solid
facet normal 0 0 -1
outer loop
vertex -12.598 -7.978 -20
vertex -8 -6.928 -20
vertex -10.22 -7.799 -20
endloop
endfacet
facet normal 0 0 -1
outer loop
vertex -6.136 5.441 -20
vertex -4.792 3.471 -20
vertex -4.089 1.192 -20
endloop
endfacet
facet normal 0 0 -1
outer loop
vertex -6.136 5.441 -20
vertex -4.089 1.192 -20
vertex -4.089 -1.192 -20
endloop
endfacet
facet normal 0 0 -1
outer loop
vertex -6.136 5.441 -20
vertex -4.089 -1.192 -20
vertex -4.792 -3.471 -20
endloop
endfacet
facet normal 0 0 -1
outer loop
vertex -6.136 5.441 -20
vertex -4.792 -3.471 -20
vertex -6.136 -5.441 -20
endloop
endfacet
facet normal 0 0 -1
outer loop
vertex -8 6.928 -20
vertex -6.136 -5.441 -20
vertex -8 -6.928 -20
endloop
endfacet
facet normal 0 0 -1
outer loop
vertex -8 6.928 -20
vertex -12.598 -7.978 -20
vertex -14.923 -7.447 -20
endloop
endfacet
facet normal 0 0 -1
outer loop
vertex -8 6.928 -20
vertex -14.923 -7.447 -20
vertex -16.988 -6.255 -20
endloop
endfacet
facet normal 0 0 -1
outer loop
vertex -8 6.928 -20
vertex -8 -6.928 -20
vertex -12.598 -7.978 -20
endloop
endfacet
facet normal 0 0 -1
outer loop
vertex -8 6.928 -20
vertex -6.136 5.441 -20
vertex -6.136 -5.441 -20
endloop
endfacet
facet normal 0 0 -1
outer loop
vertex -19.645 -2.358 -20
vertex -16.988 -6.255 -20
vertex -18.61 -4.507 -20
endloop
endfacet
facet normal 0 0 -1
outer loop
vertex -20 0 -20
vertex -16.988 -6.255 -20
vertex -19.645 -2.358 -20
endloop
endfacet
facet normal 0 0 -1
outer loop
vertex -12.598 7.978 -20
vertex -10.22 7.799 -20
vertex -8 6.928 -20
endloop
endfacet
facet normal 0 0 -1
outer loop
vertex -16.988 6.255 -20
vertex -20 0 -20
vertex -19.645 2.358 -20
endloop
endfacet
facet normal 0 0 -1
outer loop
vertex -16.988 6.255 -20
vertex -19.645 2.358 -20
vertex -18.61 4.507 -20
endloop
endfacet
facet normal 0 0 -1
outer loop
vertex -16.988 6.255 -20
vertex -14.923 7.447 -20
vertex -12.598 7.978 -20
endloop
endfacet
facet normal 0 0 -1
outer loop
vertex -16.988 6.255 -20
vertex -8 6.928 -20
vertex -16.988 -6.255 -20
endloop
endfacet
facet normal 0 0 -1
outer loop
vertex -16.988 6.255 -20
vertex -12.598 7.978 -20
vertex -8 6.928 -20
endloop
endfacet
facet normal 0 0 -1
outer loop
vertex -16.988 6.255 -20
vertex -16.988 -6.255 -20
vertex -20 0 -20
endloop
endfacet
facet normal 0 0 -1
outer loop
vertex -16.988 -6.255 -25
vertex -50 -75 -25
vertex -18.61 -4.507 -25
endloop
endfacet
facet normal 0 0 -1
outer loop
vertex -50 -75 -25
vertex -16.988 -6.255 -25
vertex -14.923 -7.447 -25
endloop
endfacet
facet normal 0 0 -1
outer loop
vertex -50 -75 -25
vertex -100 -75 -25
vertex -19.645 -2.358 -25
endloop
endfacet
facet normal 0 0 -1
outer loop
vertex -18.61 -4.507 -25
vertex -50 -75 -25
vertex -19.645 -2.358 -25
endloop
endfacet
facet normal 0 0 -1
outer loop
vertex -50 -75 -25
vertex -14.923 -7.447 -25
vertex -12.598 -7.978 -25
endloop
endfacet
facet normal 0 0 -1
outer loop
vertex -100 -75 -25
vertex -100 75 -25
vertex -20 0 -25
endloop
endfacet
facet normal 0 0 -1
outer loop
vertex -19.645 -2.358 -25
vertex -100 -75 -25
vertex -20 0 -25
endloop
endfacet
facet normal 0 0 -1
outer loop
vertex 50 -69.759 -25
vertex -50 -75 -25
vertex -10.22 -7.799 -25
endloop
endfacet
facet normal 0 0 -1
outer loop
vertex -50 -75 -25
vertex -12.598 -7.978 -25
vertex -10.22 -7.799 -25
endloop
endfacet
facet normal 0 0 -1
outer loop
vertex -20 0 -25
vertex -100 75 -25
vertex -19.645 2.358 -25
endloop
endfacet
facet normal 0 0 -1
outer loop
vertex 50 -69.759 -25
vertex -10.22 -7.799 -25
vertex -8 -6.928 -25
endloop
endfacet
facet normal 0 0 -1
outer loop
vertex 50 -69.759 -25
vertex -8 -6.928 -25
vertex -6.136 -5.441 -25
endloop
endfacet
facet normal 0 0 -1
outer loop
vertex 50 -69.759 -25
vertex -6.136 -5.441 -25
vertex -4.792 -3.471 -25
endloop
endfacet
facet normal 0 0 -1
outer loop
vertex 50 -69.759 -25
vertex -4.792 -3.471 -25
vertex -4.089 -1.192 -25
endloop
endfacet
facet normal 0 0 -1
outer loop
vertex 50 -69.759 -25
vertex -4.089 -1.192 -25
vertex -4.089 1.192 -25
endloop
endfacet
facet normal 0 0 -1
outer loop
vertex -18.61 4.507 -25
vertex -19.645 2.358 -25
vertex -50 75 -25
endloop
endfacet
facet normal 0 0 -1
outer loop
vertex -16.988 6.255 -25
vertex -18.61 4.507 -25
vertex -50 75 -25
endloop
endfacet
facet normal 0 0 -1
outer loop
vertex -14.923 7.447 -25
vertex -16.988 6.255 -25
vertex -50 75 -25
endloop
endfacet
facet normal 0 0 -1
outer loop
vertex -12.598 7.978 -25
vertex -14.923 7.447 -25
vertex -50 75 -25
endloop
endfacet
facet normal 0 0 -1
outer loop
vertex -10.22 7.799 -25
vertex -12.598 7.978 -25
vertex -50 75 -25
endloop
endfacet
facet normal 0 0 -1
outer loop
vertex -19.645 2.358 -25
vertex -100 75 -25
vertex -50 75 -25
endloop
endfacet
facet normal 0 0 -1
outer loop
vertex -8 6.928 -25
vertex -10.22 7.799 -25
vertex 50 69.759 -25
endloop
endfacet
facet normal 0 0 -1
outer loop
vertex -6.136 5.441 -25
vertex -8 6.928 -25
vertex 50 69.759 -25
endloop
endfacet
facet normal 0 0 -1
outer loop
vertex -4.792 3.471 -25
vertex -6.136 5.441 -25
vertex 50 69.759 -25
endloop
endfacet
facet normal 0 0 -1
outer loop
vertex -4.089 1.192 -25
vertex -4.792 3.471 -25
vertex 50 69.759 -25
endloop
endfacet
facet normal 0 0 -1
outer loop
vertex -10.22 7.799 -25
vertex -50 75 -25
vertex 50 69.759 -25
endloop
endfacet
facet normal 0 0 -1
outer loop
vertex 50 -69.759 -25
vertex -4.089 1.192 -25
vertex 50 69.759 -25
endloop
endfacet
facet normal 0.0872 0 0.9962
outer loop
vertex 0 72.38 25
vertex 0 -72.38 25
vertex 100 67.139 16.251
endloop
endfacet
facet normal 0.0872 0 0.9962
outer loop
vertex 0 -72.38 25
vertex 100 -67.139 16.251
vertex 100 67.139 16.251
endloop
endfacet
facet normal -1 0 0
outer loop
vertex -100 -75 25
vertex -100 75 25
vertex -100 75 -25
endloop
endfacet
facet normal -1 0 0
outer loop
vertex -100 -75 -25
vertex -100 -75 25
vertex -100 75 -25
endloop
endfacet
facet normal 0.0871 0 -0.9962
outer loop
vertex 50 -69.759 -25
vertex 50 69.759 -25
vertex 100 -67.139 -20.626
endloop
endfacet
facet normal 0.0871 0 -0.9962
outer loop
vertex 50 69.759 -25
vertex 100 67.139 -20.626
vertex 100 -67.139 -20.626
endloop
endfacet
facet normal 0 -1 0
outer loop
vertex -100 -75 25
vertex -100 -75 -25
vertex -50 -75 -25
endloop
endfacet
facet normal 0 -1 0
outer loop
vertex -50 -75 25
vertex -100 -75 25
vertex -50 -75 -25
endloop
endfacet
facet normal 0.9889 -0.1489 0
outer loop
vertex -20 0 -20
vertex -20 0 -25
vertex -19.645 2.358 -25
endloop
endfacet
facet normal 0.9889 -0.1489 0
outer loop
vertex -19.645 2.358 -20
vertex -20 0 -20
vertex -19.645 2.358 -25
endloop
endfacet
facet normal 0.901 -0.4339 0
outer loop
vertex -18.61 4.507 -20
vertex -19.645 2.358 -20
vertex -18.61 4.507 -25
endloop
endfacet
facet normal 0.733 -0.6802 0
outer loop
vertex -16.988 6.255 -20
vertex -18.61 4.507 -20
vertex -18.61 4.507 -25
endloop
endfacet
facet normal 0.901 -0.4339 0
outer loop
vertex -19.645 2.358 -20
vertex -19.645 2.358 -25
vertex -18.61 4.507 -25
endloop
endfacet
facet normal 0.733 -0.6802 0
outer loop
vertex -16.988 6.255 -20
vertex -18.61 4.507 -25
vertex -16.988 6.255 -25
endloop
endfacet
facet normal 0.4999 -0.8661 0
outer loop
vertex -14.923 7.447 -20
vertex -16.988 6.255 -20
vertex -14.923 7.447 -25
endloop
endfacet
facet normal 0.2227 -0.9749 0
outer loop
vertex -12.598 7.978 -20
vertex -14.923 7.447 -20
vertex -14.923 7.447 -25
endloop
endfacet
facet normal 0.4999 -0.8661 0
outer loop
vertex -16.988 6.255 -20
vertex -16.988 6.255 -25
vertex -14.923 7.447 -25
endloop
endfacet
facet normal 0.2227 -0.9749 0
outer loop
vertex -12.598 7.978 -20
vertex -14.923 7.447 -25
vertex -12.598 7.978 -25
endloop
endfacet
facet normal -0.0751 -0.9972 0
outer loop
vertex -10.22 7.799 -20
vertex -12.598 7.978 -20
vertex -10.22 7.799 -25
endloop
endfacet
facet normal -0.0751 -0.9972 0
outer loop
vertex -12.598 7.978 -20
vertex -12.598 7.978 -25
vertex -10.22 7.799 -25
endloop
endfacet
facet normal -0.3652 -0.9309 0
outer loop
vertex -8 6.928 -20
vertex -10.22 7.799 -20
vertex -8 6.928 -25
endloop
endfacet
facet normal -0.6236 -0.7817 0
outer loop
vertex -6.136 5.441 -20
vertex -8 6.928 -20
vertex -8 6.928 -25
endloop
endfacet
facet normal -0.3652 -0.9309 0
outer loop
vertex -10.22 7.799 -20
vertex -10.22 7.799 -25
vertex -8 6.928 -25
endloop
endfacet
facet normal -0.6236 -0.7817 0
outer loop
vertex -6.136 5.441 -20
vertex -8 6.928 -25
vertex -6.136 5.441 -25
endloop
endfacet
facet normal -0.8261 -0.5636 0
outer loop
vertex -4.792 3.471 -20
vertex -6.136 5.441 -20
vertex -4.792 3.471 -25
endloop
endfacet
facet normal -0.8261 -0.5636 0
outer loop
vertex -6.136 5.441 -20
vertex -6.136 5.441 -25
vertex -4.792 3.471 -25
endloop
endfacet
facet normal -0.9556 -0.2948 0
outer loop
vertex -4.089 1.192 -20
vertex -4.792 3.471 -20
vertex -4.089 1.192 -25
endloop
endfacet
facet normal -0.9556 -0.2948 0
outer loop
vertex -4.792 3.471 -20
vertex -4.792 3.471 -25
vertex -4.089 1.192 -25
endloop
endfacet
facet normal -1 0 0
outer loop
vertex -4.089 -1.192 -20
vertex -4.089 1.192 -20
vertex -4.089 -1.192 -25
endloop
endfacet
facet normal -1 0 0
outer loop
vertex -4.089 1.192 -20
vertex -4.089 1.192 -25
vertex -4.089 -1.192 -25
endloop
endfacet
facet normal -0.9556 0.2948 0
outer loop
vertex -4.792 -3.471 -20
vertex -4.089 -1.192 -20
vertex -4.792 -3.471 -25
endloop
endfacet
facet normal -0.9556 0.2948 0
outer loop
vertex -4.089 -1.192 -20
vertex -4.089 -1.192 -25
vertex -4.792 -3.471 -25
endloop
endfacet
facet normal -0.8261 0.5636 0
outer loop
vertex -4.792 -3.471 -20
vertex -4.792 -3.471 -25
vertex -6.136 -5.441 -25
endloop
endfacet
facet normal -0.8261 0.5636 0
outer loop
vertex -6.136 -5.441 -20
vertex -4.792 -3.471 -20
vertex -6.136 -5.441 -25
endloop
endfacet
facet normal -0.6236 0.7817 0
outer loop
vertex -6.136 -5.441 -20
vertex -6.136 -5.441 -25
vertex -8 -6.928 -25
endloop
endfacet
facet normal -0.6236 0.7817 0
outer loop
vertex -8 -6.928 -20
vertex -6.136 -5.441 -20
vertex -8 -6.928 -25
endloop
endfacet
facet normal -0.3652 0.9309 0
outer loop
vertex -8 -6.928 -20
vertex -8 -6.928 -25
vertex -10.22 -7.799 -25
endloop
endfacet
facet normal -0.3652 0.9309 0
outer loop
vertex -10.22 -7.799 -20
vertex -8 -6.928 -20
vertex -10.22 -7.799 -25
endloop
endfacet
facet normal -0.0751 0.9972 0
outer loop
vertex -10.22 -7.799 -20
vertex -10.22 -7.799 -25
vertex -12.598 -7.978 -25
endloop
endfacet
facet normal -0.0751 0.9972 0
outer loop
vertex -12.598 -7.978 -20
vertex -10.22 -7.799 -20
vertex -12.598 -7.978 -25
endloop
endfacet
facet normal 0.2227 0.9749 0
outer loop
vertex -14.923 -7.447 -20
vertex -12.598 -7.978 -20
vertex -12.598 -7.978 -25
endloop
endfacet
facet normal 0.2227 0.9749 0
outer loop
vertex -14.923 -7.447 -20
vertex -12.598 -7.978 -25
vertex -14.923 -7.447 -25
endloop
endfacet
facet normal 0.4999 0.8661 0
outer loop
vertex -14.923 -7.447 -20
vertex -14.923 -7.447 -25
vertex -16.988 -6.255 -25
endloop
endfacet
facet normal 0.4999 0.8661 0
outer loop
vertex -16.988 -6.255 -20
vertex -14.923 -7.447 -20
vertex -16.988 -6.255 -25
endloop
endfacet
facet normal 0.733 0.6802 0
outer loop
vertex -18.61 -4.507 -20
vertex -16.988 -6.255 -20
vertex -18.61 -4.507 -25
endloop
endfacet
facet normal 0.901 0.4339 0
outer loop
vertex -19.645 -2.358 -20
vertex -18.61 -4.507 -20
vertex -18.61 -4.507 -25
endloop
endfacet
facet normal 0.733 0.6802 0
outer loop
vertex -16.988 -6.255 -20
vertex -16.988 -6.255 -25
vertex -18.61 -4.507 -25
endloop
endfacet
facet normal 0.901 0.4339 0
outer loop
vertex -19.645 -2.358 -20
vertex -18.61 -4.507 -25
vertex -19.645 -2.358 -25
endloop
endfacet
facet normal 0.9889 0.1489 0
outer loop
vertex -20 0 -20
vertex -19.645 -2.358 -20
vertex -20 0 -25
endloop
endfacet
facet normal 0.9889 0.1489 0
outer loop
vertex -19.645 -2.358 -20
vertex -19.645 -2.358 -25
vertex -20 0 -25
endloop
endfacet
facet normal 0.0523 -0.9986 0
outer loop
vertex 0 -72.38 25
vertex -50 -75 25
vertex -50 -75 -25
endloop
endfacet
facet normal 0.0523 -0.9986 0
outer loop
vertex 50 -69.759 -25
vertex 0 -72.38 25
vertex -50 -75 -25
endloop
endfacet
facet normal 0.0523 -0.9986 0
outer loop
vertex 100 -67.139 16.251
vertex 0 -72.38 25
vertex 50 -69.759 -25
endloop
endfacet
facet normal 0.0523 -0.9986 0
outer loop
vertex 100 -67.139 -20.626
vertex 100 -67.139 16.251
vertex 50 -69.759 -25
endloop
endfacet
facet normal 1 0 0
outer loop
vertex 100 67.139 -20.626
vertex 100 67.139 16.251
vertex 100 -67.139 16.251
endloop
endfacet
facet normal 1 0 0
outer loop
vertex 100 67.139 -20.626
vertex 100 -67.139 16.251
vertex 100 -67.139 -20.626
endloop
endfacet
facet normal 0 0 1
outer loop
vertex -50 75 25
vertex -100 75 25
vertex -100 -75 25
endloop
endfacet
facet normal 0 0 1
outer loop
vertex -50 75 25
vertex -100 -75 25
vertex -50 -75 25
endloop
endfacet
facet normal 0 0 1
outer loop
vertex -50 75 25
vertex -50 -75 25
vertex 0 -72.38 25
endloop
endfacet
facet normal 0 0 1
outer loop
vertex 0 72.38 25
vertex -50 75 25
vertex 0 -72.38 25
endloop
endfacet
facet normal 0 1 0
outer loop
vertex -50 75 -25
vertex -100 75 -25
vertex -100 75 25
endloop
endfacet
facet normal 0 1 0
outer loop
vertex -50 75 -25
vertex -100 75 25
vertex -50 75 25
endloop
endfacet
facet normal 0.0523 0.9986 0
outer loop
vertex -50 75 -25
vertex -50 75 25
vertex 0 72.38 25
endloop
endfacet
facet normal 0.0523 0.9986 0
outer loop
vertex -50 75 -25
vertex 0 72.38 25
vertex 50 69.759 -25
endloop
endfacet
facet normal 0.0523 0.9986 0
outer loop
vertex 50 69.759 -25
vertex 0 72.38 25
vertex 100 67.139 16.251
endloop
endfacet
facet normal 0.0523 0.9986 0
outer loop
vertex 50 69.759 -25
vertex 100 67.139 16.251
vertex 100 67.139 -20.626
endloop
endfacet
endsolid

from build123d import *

# Parameters (mm, degrees)
SKETCH_1_W          = 200
SKETCH_1_H          = 50
EXTRUDE_1_DEPTH     = 75
CHAMFER_1_SIZE      = 100
CHAMFER_1_SIZE2     = 8.748866353
CHAMFER_2_SIZE      = 50
CHAMFER_2_SIZE2     = 4.374433176
CHAMFER_3_SIZE      = 150
CHAMFER_3_SIZE2     = 7.861166892
CHAMFER_4_SIZE      = 150
CHAMFER_4_SIZE2     = 7.861166892
SKETCH_2_R          = 8
CUT_EXTRUDE_1_DEPTH = 5


with BuildPart() as part:
    # 草图1 → 凸台-拉伸1 (new, symmetric)
    with BuildSketch(Plane(origin=(0, 0, 0), x_dir=(1, 0, 0), z_dir=(0, 1, 0))):
        Rectangle(SKETCH_1_W, SKETCH_1_H)
    extrude(amount=EXTRUDE_1_DEPTH, both=True)

    # 倒角1
    chamfer_1_edges = [part.edges().sort_by_distance(p)[0] for p in [
        (100, 0, 25),
    ]]
    chamfer_1_side = [part.faces().sort_by_distance(p)[0] for p in [
        (0, 0, 25),
    ]]
    chamfer(chamfer_1_edges, length=CHAMFER_1_SIZE, length2=CHAMFER_1_SIZE2, reference=chamfer_1_side[0])

    # 倒角2
    chamfer_2_edges = [part.edges().sort_by_distance(p)[0] for p in [
        (100, 0, -25),
    ]]
    chamfer_2_side = [part.faces().sort_by_distance(p)[0] for p in [
        (0, 0, -25),
    ]]
    chamfer(chamfer_2_edges, length=CHAMFER_2_SIZE, length2=CHAMFER_2_SIZE2, reference=chamfer_2_side[0])

    # 倒角3
    chamfer_3_edges = [part.edges().sort_by_distance(p)[0] for p in [
        (100, -75, -2.187216588),
    ]]
    chamfer_3_side = [part.faces().sort_by_distance(p)[0] for p in [
        (-4.049031765, -75, -0.749568205),
    ]]
    chamfer(chamfer_3_edges, length=CHAMFER_3_SIZE, length2=CHAMFER_3_SIZE2, reference=chamfer_3_side[0])

    # 倒角4
    chamfer_4_edges = [part.edges().sort_by_distance(p)[0] for p in [
        (100, 75, -2.187216588),
    ]]
    chamfer_4_side = [part.faces().sort_by_distance(p)[0] for p in [
        (-4.049031765, 75, -0.749568205),
    ]]
    chamfer(chamfer_4_edges, length=CHAMFER_4_SIZE, length2=CHAMFER_4_SIZE2, reference=chamfer_4_side[0])

    # 草图2 → 切除-拉伸1 (cut)
    with BuildSketch(Plane(origin=(0, 0, -25), x_dir=(-1, 0, 0), z_dir=(0, 0, -1))):
        with Locations((12, 0)):
            Circle(SKETCH_2_R)
    extrude(amount=-CUT_EXTRUDE_1_DEPTH, mode=Mode.SUBTRACT)


solid = part.part
